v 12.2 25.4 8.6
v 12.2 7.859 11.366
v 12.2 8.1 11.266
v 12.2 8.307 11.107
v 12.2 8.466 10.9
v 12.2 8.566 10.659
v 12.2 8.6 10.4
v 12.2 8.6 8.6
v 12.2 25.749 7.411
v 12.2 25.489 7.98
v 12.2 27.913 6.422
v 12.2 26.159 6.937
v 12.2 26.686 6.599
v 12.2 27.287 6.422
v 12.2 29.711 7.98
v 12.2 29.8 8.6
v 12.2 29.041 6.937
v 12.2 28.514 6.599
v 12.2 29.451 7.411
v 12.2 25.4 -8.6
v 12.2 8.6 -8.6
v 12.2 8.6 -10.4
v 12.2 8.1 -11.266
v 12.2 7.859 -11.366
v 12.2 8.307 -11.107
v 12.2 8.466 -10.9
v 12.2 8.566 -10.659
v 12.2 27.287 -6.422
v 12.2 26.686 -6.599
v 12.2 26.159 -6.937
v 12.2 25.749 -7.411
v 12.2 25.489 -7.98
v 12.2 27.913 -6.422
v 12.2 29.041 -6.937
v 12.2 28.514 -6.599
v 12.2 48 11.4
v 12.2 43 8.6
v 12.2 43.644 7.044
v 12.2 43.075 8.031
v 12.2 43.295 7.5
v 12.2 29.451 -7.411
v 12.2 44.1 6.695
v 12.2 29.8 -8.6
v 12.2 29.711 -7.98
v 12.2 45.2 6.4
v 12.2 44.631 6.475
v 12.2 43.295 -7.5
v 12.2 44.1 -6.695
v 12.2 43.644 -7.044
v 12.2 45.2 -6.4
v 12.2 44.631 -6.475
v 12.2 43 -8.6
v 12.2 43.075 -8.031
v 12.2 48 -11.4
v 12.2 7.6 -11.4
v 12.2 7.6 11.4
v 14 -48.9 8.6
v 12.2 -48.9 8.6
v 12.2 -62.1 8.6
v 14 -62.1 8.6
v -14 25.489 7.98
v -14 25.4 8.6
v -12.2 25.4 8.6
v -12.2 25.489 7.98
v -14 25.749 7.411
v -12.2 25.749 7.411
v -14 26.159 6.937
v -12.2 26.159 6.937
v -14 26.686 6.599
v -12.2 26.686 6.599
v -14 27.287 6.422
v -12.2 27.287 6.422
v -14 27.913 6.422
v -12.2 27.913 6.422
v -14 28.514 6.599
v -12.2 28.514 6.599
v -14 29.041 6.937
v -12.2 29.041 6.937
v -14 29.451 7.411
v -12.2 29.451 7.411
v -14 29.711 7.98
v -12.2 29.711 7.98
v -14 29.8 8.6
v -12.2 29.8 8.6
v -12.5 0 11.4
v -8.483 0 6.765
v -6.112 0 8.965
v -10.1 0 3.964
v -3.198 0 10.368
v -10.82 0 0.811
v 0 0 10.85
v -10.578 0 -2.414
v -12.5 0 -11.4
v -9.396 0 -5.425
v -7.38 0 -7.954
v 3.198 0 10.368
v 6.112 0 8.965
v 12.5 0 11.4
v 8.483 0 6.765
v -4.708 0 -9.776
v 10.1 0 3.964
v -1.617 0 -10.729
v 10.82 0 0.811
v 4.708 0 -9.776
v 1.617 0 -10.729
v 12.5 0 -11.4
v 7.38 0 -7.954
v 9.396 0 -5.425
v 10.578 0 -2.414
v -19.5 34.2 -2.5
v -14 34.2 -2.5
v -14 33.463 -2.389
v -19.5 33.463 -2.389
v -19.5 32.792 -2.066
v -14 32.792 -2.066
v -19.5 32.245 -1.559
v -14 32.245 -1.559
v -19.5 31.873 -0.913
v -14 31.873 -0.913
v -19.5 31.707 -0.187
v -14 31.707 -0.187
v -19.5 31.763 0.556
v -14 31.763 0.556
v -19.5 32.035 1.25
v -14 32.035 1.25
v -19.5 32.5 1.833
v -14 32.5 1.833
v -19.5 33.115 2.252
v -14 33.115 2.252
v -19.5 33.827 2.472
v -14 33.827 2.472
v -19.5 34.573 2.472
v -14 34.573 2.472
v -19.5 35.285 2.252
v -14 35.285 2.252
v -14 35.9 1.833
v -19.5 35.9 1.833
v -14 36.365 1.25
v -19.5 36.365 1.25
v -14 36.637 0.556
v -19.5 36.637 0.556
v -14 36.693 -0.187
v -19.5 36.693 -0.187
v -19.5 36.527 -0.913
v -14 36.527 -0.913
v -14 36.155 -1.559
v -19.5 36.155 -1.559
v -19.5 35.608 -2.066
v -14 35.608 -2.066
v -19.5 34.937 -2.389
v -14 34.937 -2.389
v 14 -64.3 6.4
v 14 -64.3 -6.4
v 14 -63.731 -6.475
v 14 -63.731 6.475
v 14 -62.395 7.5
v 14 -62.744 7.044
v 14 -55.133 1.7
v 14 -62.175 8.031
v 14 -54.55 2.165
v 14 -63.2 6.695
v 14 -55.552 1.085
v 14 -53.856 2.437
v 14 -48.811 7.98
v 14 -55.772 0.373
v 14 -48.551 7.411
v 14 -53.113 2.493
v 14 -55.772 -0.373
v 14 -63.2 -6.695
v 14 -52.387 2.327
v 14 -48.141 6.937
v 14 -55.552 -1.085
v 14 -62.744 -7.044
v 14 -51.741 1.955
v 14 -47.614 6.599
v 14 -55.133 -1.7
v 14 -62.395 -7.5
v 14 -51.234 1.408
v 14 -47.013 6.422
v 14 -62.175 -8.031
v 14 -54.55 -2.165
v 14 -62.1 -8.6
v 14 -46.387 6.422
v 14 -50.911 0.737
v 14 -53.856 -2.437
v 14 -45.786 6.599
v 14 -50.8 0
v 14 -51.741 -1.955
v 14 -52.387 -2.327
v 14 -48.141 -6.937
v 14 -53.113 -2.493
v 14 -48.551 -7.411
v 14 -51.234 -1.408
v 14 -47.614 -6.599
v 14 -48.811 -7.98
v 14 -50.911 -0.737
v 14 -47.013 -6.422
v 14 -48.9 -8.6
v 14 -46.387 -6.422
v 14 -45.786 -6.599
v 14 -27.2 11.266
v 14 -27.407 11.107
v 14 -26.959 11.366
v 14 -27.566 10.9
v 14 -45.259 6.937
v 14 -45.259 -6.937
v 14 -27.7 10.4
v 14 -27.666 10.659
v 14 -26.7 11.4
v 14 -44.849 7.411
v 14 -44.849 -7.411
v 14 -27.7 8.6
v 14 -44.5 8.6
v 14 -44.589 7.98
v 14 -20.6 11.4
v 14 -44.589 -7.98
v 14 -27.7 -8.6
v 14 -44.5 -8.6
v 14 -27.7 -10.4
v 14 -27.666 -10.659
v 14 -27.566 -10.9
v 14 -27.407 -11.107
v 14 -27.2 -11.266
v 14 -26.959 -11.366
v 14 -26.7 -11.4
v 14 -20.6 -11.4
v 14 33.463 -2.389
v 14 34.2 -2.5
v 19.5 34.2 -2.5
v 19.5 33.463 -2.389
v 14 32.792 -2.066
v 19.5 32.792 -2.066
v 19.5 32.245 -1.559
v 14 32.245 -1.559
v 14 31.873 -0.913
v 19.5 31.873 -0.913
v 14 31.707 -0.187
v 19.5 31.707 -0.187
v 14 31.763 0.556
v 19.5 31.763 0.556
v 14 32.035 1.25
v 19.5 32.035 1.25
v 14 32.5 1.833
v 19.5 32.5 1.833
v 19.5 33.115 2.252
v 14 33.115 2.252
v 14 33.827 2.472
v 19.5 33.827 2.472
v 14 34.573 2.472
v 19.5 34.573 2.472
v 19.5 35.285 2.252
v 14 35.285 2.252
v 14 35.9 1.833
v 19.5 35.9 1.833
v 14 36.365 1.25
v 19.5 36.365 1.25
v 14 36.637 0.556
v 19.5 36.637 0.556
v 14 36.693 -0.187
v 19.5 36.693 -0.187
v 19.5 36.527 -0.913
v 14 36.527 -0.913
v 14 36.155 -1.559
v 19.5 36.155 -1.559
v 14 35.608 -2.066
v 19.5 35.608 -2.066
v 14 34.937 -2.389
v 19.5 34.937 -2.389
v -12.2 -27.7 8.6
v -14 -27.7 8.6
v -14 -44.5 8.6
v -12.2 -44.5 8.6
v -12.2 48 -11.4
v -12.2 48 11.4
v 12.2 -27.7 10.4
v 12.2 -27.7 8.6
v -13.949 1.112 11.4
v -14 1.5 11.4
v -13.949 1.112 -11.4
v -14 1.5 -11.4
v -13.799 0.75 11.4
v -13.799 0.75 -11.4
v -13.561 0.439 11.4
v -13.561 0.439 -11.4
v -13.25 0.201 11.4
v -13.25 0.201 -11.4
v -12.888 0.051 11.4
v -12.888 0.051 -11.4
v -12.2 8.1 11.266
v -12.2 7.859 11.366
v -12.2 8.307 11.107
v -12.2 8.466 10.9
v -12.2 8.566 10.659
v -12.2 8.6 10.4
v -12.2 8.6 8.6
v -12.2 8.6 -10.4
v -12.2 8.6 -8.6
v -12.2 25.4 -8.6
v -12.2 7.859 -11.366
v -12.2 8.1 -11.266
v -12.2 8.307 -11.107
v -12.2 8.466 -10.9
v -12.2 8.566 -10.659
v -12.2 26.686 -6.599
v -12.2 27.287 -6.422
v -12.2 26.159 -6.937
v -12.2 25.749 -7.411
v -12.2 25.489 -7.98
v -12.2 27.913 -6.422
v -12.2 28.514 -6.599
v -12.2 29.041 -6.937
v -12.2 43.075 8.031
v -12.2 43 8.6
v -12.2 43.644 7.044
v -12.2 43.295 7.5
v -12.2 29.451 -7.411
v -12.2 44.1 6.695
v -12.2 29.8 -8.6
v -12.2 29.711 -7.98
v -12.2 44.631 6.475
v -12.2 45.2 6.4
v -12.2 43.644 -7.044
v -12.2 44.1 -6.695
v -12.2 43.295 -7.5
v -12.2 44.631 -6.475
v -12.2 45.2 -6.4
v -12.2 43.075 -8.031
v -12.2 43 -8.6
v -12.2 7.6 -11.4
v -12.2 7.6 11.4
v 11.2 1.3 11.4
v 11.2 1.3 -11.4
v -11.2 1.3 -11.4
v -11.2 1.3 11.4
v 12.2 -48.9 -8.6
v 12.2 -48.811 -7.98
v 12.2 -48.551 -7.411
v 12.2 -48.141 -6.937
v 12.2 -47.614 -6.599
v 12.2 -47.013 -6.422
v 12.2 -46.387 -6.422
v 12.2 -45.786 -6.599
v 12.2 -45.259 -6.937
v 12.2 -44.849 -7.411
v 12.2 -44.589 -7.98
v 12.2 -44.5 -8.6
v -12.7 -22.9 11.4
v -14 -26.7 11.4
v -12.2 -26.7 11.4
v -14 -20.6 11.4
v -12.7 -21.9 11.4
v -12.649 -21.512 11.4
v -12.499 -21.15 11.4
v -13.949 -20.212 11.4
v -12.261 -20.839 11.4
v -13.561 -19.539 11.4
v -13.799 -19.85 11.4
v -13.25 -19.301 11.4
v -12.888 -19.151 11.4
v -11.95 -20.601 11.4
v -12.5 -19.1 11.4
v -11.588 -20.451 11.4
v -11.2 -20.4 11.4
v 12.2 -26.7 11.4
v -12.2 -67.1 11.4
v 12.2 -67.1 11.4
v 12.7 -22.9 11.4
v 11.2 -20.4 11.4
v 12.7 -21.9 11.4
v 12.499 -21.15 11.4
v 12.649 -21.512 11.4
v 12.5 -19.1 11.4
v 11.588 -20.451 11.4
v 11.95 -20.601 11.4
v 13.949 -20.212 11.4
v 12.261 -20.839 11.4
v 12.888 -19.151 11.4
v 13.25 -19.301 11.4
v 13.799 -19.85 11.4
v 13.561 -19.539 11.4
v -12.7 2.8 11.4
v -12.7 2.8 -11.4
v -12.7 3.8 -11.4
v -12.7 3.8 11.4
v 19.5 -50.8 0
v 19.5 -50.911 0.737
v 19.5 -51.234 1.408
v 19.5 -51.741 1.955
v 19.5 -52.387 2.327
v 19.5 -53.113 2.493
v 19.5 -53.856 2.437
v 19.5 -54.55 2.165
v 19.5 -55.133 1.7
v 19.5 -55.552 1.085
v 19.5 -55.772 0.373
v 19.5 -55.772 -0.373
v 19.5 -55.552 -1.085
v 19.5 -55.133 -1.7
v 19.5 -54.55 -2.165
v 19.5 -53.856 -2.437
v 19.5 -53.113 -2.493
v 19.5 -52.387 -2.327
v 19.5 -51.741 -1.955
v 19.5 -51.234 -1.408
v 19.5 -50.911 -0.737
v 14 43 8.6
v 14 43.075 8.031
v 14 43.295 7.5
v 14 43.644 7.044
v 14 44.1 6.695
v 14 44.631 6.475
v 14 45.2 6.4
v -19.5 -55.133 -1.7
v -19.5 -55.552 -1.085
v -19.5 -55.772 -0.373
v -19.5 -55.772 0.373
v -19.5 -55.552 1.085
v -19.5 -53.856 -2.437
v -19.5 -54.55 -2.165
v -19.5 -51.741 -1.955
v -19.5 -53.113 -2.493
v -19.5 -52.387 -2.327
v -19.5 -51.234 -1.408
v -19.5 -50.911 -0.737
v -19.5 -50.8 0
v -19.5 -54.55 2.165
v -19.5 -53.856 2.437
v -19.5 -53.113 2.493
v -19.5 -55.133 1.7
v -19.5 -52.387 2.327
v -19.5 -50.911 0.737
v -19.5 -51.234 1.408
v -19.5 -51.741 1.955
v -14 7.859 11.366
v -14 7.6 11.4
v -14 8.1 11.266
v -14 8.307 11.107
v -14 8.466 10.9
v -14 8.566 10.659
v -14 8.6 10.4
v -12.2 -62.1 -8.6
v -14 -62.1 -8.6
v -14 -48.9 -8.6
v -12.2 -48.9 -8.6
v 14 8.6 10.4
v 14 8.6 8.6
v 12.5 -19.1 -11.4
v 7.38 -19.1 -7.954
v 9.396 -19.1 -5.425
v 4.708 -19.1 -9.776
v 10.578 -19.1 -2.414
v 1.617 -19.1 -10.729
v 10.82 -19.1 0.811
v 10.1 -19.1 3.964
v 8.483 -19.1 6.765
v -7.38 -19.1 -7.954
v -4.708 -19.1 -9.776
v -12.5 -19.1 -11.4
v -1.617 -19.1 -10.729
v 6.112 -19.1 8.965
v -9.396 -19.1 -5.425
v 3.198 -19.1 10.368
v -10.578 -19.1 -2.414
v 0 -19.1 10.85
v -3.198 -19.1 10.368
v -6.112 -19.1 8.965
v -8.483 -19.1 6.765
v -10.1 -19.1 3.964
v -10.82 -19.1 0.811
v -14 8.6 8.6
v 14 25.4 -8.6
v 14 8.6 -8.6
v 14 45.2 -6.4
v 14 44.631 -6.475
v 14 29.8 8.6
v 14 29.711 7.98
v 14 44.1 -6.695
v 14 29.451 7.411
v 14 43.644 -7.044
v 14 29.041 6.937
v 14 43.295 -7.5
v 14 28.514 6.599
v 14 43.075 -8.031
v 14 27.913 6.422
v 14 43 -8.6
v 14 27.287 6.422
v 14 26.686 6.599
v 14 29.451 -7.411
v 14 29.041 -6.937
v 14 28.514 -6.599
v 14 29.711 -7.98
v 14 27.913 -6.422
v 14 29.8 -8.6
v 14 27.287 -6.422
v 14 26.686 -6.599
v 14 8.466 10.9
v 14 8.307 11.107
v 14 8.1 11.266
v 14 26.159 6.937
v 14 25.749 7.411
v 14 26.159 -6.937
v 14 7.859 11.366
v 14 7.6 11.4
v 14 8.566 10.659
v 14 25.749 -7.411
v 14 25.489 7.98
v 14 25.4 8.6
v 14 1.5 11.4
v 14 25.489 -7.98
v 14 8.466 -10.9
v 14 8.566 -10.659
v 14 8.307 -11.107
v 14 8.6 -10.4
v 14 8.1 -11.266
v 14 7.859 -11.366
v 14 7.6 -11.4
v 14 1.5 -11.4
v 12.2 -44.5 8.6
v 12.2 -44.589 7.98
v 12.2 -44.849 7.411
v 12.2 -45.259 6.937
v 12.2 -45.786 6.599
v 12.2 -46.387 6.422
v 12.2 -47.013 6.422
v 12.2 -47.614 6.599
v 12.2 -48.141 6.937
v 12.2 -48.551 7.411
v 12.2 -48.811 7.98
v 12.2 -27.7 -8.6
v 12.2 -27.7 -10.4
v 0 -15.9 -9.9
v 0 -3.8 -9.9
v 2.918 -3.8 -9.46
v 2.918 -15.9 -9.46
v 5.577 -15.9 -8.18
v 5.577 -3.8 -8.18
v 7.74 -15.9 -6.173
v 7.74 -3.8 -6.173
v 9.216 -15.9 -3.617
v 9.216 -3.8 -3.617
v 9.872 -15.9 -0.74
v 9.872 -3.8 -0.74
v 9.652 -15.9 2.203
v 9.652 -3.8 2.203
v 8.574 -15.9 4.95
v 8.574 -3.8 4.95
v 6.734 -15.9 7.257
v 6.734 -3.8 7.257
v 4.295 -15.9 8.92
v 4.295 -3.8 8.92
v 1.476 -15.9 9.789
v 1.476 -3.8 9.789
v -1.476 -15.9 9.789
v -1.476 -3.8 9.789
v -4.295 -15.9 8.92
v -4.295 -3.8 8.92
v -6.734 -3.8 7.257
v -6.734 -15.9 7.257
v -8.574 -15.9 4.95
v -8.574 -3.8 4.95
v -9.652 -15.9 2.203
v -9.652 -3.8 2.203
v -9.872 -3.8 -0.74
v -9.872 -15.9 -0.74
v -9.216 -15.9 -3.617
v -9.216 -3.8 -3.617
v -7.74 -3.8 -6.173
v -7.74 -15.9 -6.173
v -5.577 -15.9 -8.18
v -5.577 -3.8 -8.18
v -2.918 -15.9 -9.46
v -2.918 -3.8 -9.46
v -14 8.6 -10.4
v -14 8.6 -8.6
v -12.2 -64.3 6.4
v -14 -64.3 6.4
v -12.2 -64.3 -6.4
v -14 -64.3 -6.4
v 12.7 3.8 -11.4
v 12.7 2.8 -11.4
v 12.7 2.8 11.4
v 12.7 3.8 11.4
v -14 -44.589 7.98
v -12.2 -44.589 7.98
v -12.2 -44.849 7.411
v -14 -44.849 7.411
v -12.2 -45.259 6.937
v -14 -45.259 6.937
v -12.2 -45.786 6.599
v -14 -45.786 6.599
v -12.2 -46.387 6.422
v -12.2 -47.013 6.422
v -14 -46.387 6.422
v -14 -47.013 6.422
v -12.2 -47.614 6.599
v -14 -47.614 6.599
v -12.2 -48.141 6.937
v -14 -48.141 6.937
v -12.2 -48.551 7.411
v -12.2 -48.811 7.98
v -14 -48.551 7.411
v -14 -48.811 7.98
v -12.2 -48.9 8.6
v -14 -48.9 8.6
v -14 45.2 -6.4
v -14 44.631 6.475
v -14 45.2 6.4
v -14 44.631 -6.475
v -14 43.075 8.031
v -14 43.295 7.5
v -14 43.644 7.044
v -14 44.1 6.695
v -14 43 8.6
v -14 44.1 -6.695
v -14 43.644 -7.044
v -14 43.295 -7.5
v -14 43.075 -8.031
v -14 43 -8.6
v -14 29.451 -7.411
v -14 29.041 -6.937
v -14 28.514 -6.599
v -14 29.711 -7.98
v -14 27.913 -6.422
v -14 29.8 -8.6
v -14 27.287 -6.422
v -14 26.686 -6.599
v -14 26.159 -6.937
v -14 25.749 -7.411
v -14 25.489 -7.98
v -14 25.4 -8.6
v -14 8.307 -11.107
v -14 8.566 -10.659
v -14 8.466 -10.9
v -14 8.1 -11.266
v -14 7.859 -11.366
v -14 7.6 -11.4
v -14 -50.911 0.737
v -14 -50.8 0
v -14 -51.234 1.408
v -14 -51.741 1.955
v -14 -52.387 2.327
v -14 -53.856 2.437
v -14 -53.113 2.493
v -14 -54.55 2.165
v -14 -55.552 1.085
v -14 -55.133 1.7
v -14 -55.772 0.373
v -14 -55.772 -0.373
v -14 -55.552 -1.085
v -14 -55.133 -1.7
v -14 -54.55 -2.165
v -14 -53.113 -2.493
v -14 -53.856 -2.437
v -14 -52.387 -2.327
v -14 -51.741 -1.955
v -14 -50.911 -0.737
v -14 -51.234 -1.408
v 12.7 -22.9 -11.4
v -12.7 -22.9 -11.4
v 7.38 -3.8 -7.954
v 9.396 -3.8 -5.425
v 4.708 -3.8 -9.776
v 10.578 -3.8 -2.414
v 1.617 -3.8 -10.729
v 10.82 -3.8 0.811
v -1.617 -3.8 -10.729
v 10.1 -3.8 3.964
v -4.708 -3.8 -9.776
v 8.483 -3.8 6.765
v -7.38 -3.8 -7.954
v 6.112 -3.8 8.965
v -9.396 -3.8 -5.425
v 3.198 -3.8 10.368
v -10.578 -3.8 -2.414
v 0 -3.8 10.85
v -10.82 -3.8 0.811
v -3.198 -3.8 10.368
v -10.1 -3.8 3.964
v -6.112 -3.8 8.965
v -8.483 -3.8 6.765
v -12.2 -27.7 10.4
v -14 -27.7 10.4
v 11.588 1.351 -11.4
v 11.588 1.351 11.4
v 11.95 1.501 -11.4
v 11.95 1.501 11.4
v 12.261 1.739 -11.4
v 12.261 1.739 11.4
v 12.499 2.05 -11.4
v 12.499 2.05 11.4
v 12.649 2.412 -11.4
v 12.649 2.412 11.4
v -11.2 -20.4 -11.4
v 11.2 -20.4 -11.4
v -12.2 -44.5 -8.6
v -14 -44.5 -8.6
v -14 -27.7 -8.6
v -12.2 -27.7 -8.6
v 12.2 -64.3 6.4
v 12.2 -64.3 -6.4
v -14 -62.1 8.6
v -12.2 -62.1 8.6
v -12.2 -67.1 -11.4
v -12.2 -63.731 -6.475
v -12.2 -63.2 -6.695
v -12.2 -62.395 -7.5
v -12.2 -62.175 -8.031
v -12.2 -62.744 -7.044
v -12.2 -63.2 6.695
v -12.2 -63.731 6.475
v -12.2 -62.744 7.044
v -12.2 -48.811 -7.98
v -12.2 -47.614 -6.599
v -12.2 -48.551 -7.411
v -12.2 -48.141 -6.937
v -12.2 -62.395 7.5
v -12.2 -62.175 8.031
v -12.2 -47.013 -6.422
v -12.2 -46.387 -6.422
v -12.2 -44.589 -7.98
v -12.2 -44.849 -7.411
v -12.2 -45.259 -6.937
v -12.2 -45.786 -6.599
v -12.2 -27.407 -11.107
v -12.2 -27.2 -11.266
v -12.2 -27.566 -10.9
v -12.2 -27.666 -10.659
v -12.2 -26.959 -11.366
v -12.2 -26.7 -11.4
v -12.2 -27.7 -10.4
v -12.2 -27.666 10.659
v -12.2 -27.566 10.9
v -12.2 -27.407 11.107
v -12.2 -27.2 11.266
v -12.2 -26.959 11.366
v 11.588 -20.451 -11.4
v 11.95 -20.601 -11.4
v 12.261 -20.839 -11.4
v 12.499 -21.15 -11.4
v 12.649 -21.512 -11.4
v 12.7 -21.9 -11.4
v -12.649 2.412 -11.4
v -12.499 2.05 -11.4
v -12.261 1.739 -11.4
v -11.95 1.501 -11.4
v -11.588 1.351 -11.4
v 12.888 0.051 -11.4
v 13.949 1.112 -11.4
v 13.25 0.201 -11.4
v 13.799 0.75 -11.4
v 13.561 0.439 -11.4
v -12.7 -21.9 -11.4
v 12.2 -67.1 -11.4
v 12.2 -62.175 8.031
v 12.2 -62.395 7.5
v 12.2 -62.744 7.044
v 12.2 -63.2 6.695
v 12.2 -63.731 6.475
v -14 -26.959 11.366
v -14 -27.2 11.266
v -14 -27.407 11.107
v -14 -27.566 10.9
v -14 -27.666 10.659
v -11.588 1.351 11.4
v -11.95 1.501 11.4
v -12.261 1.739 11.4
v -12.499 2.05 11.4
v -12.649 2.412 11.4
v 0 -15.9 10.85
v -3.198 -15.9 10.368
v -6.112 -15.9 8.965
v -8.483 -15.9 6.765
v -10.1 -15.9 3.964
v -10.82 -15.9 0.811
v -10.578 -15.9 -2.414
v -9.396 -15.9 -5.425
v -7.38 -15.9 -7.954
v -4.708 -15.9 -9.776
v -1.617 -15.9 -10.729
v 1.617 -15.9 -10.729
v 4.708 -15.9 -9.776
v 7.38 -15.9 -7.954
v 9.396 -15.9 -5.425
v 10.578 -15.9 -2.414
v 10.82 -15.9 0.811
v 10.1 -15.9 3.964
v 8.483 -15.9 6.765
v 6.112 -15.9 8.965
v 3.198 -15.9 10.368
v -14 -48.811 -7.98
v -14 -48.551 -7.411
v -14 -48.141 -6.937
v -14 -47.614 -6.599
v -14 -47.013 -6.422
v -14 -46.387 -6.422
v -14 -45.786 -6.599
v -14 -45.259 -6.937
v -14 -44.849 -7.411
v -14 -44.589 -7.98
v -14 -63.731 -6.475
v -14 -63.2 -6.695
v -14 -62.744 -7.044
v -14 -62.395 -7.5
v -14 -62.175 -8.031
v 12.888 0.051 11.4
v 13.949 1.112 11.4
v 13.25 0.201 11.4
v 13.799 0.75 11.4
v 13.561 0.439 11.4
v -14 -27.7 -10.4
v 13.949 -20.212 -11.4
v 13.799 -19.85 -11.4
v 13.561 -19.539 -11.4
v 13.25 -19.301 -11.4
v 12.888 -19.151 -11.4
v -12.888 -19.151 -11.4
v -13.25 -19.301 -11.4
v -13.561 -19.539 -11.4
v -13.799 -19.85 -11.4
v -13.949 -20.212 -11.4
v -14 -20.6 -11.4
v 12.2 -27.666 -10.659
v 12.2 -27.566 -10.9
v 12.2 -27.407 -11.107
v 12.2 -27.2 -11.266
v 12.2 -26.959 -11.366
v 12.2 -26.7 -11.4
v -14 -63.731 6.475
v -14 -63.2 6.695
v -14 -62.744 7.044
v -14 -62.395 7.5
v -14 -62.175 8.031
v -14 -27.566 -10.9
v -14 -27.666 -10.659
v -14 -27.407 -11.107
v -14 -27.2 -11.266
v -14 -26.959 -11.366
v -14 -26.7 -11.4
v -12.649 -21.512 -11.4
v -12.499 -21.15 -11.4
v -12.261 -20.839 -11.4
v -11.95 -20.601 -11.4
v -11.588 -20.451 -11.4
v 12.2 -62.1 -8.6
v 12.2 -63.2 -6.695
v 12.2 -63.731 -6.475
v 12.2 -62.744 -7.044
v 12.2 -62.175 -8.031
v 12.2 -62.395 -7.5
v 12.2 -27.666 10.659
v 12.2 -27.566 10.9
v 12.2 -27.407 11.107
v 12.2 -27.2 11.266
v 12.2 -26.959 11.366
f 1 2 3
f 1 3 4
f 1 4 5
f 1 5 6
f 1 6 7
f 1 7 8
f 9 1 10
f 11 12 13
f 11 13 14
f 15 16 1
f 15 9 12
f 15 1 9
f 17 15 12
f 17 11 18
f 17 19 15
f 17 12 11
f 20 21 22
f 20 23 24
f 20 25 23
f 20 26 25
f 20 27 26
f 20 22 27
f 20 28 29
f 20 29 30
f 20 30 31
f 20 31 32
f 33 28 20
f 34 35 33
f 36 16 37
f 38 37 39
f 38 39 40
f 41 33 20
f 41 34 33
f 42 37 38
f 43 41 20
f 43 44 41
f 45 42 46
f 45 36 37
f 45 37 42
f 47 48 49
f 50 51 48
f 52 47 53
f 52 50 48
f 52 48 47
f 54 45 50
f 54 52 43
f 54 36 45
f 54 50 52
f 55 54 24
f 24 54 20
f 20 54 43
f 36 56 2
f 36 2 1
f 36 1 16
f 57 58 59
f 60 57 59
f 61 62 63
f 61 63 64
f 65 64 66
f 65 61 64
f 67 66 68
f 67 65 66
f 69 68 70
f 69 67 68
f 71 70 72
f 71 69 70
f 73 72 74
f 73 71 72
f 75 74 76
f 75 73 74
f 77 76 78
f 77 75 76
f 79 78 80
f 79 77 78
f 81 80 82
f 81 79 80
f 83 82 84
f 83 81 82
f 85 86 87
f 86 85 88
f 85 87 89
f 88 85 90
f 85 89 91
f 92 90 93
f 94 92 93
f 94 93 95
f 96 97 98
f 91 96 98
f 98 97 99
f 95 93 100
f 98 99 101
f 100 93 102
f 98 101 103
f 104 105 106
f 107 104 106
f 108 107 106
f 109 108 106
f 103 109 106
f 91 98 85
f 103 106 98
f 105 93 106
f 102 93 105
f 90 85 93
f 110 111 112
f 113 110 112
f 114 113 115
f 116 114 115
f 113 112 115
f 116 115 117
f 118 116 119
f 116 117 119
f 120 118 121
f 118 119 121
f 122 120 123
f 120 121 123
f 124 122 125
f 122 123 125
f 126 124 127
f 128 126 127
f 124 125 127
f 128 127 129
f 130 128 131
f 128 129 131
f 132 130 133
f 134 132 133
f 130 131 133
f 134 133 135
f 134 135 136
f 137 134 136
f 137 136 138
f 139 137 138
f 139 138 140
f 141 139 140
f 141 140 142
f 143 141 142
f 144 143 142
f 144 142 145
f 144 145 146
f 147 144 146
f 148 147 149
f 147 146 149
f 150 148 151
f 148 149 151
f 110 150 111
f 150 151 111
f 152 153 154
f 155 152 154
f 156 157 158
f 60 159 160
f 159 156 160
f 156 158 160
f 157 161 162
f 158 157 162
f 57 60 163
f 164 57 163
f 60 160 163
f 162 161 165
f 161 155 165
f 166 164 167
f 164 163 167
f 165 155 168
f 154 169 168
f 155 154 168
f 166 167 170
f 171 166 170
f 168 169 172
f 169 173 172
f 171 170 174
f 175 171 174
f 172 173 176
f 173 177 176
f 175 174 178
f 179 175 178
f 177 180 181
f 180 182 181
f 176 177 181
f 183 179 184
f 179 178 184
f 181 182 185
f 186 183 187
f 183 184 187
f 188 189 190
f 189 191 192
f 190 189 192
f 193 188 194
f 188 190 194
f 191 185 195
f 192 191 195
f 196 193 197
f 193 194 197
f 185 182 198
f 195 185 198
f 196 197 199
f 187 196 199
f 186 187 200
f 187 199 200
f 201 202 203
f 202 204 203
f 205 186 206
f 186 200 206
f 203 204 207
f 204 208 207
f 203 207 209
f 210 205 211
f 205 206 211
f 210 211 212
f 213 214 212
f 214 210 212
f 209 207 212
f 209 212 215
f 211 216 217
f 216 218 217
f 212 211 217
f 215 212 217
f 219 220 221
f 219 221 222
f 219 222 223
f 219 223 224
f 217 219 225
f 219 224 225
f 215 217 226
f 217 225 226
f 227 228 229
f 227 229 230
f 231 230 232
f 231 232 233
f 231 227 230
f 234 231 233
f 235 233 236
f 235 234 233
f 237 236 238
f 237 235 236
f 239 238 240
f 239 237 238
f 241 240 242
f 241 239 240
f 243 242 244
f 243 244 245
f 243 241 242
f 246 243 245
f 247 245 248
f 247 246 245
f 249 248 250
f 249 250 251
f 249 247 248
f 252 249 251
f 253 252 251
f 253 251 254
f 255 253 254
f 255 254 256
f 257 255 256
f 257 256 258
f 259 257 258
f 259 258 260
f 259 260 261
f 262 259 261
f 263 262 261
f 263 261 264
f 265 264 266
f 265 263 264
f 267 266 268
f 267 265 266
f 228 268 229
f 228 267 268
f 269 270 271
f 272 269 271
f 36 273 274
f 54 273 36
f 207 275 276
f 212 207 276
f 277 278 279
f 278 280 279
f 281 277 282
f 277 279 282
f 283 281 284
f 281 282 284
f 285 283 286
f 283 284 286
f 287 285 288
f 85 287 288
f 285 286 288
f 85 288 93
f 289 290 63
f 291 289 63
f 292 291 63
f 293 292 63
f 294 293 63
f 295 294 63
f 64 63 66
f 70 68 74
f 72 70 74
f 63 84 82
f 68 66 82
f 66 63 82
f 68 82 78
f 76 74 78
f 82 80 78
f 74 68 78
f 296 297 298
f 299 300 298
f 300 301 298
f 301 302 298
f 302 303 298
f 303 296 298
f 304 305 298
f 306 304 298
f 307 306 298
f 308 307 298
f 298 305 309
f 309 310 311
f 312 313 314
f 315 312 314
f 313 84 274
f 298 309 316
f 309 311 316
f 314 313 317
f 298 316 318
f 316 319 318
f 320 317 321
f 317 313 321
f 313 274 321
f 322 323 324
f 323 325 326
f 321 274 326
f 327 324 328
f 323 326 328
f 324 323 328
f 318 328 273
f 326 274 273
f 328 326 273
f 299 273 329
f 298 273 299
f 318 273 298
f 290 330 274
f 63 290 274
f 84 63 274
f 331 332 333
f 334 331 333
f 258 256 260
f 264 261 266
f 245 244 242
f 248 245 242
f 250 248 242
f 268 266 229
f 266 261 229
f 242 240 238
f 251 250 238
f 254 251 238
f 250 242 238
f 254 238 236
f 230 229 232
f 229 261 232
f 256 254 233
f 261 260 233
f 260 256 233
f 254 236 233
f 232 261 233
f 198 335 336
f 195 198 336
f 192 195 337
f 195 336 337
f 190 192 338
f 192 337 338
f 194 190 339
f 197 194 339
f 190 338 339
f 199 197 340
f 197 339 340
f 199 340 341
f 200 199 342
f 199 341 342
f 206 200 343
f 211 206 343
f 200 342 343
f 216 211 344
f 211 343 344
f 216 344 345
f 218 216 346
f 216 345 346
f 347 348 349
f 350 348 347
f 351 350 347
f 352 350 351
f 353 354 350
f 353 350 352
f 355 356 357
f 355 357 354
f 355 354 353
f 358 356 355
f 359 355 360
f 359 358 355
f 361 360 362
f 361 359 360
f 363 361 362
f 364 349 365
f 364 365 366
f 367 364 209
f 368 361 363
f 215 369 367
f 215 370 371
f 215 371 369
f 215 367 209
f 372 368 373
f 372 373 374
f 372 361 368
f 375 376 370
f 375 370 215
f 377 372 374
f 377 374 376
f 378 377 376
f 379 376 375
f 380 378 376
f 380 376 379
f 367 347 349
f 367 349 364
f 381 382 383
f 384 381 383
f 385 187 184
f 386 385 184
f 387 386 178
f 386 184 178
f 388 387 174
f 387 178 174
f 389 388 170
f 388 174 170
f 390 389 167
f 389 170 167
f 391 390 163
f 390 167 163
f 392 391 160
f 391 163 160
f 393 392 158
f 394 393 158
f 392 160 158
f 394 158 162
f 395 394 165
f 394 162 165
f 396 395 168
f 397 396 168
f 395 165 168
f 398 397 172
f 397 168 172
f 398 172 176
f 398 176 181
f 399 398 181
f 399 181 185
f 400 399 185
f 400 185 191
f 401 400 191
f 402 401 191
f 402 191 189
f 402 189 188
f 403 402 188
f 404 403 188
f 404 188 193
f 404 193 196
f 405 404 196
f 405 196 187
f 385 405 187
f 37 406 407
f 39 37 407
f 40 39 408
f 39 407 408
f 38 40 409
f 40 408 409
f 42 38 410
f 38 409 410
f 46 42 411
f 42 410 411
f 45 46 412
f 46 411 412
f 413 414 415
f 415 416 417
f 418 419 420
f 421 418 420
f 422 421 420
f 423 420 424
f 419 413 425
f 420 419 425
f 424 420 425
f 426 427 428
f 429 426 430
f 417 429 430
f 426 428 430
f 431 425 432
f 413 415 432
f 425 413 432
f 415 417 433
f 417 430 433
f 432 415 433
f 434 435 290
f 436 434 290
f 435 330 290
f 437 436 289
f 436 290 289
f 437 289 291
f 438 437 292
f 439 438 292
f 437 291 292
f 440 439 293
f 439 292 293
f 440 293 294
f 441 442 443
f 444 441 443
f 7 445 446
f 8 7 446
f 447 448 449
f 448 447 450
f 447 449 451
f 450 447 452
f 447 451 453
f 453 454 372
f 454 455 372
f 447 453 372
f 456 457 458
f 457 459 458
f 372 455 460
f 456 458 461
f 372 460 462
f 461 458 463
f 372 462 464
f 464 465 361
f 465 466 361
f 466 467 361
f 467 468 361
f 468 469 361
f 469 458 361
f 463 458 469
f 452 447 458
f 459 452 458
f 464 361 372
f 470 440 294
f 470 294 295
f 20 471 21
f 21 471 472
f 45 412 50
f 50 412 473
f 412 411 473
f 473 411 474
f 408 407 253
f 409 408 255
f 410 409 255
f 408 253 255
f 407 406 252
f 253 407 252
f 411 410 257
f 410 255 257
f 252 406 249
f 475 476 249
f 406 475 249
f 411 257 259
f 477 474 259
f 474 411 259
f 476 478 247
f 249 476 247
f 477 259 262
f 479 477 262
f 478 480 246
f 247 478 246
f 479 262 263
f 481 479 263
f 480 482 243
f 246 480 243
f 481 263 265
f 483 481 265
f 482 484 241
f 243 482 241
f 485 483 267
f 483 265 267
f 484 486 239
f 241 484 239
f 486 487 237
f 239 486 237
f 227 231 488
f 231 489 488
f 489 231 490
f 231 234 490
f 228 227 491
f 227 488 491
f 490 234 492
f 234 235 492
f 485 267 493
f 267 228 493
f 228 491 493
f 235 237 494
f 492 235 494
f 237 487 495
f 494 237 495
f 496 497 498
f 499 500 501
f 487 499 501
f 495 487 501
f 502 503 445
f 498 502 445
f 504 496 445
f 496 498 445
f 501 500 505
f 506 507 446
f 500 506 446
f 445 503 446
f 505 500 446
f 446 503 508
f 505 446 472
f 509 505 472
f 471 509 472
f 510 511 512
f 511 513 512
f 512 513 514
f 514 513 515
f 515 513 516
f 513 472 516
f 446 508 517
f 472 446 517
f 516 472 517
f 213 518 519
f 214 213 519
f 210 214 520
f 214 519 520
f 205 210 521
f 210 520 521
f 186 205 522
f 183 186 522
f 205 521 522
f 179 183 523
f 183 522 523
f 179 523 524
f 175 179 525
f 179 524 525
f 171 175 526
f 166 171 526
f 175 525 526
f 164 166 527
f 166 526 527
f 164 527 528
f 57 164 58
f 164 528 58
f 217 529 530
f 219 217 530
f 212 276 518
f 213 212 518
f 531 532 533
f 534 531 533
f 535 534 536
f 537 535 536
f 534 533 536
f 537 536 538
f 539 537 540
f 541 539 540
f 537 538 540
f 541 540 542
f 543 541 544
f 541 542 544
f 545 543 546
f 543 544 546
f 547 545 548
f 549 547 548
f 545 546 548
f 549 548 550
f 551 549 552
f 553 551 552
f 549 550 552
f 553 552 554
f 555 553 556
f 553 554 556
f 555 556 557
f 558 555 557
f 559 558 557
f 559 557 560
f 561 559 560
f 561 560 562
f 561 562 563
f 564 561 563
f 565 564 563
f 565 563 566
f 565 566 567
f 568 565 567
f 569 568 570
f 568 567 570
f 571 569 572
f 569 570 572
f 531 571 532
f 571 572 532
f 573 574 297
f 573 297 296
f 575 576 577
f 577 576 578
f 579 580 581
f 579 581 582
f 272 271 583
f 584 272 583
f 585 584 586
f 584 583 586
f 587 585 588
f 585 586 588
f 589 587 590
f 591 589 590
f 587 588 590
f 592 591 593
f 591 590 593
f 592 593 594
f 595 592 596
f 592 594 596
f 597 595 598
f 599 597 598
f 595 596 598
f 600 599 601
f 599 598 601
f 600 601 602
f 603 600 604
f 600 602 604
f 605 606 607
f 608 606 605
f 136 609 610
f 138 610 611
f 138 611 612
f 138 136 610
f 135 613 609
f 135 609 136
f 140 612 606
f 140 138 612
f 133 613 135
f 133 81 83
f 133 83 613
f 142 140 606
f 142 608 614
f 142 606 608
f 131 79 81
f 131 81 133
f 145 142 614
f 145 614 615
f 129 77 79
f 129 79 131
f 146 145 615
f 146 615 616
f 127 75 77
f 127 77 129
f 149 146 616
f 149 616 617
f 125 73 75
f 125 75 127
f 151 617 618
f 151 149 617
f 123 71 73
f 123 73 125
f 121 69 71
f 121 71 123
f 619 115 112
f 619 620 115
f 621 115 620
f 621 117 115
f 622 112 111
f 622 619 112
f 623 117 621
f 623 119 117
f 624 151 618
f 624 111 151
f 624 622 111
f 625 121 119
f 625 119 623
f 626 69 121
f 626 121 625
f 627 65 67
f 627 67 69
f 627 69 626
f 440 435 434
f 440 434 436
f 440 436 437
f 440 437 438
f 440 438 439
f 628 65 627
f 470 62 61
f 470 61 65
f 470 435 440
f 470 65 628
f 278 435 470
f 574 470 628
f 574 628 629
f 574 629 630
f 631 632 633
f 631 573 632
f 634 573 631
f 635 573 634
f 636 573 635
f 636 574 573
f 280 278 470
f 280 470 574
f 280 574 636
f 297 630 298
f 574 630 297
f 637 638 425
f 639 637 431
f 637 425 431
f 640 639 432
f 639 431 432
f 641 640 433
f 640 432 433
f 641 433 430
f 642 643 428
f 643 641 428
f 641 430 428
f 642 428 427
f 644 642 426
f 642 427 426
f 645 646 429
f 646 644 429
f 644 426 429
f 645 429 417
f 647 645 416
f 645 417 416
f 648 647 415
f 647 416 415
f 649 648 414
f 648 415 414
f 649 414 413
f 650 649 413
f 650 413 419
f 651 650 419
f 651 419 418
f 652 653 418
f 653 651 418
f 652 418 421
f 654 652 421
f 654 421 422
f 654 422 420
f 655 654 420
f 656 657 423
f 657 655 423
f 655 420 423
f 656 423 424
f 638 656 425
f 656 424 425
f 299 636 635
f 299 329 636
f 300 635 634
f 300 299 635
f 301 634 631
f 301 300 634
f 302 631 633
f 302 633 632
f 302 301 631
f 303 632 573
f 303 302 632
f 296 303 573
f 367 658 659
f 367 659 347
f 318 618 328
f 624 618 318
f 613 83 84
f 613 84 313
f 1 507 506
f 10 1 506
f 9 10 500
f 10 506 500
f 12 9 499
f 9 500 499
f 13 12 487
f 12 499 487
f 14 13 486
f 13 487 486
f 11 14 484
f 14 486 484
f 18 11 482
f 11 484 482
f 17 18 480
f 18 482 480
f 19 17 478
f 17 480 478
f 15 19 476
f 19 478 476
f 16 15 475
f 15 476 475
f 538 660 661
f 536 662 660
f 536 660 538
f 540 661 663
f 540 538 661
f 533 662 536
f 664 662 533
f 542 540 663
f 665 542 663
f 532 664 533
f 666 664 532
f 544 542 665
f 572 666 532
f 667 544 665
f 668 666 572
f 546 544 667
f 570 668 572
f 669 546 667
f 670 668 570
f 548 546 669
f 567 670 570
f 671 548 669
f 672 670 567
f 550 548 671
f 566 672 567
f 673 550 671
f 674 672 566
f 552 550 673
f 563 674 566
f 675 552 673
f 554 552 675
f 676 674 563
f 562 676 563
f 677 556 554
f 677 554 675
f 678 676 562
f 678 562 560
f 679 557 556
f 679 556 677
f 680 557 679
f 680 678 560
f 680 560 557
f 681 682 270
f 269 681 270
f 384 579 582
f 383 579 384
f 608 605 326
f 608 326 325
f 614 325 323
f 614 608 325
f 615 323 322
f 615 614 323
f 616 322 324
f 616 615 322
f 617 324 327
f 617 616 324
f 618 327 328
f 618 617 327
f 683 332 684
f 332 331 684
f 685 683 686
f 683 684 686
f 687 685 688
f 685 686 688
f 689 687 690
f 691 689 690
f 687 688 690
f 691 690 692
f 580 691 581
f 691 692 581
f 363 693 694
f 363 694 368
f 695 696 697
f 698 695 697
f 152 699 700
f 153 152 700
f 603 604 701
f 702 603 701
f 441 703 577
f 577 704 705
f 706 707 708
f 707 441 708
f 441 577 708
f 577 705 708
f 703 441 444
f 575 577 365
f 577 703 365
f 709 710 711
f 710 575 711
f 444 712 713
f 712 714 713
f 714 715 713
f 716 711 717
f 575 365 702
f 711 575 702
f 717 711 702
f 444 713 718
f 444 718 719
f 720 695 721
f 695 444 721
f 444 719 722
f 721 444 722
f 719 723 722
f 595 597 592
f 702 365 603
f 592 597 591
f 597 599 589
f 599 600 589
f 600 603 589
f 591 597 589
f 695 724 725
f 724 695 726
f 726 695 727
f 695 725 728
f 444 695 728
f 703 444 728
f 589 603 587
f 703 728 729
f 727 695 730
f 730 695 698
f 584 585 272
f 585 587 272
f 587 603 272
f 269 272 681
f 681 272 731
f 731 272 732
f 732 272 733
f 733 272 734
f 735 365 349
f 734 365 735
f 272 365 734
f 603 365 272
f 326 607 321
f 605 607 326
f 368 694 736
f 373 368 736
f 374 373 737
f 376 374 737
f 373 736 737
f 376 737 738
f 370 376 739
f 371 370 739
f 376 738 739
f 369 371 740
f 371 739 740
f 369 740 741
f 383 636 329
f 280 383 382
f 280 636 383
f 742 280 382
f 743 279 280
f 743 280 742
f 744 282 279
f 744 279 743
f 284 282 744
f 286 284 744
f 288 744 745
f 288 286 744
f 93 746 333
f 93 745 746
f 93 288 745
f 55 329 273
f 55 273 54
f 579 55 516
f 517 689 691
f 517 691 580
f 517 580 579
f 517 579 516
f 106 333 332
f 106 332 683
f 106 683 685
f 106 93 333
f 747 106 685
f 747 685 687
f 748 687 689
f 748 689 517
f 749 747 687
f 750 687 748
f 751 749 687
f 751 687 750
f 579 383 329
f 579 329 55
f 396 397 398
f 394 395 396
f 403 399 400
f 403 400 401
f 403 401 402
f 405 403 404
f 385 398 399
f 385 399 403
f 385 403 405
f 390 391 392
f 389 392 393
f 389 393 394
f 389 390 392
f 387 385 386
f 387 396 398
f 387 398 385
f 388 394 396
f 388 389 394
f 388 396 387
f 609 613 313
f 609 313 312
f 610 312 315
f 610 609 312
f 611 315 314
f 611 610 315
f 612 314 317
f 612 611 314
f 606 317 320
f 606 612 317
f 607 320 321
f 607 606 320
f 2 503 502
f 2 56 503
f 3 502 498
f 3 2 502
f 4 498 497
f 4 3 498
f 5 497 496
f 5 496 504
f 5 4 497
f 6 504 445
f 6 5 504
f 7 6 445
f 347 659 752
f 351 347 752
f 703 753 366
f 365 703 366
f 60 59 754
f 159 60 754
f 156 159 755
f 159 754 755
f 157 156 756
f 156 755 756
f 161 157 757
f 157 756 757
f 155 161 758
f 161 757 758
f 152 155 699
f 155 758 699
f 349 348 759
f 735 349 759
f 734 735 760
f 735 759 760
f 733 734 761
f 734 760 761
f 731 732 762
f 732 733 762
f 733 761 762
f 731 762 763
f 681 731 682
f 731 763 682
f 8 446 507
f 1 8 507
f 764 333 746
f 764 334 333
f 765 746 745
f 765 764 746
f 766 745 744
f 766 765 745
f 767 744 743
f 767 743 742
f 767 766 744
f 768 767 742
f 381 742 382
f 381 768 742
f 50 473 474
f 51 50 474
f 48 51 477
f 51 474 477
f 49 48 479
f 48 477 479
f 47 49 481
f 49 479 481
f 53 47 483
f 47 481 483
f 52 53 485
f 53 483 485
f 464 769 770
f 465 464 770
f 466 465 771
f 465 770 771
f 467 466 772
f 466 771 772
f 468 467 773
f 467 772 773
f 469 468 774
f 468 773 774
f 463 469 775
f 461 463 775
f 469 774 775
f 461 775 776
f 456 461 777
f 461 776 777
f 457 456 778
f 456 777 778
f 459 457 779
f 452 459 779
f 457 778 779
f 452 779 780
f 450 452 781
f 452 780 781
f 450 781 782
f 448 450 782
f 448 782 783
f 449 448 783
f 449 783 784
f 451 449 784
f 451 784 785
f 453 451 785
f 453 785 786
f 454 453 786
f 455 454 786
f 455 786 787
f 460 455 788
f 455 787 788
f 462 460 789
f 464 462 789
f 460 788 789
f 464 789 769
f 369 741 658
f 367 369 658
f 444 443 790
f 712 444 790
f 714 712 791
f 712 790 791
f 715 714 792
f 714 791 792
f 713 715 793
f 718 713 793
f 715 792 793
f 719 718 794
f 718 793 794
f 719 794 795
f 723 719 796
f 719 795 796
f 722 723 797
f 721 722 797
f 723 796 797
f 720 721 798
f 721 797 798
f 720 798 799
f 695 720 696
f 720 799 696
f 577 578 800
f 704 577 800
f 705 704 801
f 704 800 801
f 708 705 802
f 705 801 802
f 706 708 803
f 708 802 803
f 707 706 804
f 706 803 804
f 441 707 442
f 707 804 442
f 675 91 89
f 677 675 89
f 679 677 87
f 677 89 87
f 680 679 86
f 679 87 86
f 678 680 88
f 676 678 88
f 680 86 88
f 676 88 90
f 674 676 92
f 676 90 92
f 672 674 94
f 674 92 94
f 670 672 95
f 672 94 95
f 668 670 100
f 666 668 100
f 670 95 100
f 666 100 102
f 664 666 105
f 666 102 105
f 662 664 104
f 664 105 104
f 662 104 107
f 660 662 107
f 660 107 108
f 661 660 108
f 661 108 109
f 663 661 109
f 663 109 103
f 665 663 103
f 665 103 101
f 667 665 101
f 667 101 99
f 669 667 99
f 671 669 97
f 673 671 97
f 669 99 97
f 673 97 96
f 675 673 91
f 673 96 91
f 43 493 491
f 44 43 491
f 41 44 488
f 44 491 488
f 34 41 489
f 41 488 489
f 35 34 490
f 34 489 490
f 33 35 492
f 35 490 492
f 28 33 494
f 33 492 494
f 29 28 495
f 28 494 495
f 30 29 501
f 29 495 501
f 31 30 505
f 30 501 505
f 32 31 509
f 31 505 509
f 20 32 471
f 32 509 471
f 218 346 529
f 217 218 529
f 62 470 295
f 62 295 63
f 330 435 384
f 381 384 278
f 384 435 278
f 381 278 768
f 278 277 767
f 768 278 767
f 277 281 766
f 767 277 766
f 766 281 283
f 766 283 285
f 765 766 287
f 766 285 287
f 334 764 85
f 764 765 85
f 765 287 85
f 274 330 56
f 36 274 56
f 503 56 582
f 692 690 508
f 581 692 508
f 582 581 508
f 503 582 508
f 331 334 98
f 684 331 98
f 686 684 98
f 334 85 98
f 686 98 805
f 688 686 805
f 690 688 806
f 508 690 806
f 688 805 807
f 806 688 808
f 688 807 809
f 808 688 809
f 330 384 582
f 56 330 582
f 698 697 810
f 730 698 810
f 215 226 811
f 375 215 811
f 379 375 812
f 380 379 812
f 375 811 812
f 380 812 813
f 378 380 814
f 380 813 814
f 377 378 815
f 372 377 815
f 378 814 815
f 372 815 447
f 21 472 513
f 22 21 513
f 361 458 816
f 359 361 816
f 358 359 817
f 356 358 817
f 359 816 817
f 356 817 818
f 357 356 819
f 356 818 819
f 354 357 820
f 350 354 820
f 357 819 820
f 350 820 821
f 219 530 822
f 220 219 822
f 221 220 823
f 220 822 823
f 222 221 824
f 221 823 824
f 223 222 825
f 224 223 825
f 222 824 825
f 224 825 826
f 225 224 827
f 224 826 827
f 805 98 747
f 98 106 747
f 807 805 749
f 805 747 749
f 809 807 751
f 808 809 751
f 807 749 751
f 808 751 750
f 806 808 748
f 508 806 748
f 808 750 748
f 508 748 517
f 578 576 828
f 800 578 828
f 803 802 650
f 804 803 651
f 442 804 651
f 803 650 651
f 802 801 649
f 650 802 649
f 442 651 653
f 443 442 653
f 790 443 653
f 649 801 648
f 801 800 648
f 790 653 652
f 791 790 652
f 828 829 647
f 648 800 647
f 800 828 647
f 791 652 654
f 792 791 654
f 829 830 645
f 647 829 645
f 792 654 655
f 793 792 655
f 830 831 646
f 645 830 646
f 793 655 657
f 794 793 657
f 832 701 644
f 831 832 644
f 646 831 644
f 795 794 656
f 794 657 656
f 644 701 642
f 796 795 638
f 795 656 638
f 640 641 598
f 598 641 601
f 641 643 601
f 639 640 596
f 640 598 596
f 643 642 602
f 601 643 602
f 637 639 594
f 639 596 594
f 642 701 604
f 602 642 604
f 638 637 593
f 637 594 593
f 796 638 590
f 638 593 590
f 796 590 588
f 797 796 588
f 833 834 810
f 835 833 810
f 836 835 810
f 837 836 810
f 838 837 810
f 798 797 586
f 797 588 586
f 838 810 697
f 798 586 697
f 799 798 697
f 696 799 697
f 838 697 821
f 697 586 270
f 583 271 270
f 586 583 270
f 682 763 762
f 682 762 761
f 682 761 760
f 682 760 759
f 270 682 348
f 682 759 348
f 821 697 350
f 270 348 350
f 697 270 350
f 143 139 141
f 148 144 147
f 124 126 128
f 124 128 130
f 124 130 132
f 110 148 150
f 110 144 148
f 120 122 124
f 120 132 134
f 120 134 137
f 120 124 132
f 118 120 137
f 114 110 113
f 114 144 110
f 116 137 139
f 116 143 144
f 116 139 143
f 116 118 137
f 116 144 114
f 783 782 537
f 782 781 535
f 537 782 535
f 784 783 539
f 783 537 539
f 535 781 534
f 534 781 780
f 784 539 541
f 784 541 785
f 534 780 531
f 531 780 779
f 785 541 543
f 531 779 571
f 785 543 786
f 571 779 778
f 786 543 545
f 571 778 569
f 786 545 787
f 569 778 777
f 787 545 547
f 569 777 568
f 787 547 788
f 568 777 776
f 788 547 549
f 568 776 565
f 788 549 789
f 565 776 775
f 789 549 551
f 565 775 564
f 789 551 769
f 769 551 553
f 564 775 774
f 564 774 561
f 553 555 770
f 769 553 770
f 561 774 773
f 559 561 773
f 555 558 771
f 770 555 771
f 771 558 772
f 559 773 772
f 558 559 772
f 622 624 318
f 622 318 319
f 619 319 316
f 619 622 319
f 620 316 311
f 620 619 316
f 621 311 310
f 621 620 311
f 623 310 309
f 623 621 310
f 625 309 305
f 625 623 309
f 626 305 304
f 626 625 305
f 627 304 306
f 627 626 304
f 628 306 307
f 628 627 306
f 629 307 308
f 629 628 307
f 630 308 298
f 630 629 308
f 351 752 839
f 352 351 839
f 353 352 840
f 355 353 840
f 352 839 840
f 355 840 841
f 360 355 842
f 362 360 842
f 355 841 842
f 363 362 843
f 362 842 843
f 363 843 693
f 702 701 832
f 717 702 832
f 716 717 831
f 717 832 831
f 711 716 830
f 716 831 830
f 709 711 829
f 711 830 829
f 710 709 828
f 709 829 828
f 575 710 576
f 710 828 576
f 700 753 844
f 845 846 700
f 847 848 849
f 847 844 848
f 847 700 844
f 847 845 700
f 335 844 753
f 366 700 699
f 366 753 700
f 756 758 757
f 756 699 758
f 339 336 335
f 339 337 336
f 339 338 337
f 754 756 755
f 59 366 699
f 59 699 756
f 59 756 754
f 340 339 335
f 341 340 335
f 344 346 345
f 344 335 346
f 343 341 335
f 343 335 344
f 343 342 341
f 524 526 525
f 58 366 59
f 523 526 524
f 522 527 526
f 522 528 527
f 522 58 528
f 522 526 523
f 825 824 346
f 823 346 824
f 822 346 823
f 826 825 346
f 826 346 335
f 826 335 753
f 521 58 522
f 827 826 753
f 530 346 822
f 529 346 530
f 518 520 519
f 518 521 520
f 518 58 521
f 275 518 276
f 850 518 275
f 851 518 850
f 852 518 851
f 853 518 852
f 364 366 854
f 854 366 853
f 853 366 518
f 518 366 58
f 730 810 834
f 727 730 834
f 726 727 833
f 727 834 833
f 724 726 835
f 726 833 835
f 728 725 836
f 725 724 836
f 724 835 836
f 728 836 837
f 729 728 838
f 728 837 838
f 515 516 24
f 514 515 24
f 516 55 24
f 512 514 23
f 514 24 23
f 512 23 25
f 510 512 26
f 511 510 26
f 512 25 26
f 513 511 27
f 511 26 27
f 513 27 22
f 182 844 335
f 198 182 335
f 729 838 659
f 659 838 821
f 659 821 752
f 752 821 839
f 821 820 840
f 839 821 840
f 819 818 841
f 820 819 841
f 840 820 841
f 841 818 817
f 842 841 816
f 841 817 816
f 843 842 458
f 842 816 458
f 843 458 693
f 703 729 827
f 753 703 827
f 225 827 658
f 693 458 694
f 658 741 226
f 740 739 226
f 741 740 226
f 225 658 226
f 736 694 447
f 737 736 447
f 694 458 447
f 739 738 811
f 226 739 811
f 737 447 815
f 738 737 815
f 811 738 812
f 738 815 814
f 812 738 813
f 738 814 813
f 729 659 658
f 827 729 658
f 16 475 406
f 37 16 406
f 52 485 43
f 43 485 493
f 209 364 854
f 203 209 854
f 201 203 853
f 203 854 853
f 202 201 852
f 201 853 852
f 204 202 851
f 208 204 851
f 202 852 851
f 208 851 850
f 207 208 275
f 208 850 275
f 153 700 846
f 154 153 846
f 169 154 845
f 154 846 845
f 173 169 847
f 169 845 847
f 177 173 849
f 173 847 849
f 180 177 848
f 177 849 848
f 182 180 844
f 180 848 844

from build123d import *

# Parameters (mm, degrees)
SKETCH1_W            = 28
SKETCH1_H            = 22.8
BOSS_EXTRUDE1_DEPTH  = 48
SKETCH4_R            = 10.85
BOSS_EXTRUDE4_DEPTH  = 3.8
SKETCH5_R            = 9.9
BOSS_EXTRUDE5_DEPTH  = 12.1
SKETCH6_R            = 10.85
BOSS_EXTRUDE6_DEPTH  = 3.2
CUT_EXTRUDE3_DEPTH   = 1.8
FILLET2_R            = 1
FILLET2_OF_MIRROR2_R = 1
SKETCH9_W            = 25.4
SKETCH9_H            = 2.5
CUT_EXTRUDE4_DEPTH   = 25.8
FILLET3_R            = 1.5
SKETCH10_R           = 2.5
BOSS_EXTRUDE7_DEPTH  = 5.5
MIRROR6_START        = -12.2
MIRROR6_OUTLINE_W    = 1.3
MIRROR6_OUTLINE_H    = 22.8
MIRROR6_OUTLINE_W_2  = 44.2
MIRROR6_DEPTH        = 24.4
MIRROR6_START_2      = -14
MIRROR6_2_DEPTH      = 28
MIRROR6_START_3      = -19.5
MIRROR6_3_OUTLINE_R  = 2.5
MIRROR6_3_DEPTH      = 39
MIRROR6_START_4      = -12.5
MIRROR6_4_OUTLINE_W  = 1.3
MIRROR6_4_OUTLINE_H  = 22.8
MIRROR6_4_DEPTH      = 25
MIRROR6_START_5      = -11.4
MIRROR6_5_DEPTH      = 22.8


with BuildPart() as part:
    # Sketch1 → Boss-Extrude1 (new body)
    with BuildSketch(Plane(origin=(0, 0, 0), x_dir=(1, 0, 0), z_dir=(0, 1, 0))):
        Rectangle(SKETCH1_W, SKETCH1_H)
    extrude(amount=BOSS_EXTRUDE1_DEPTH)

    # Sketch4 → Boss-Extrude4 (add)
    with BuildSketch(Plane.XZ):
        with Locations(Location((0, 0, 0), (0, 0, 90))):
            Circle(SKETCH4_R)
    extrude(amount=BOSS_EXTRUDE4_DEPTH)

    # Sketch5 → Boss-Extrude5 (add)
    with BuildSketch(Plane.XZ.offset(3.8)):
        with Locations(Location((0, 0, 0), (0, 0, 270))):
            Circle(SKETCH5_R)
    extrude(amount=BOSS_EXTRUDE5_DEPTH)

    # Sketch6 → Boss-Extrude6 (add)
    with BuildSketch(Plane.XZ.offset(15.9)):
        with Locations(Location((0, 0, 0), (0, 0, 90))):
            Circle(SKETCH6_R)
    extrude(amount=BOSS_EXTRUDE6_DEPTH)

    # Sketch8 → Cut-Extrude3 (cut)
    with BuildSketch(Plane(origin=(14, 0, 0), x_dir=(0, 0, -1), z_dir=(1, 0, 0))):
        with BuildLine():
            Line((8.6, 8.6), (11.4, 8.6))
            Line((11.4, 8.6), (11.4, 48))
            Line((11.4, 48), (-11.4, 48))
            Line((-11.4, 48), (-11.4, 8.6))
            Line((-11.4, 8.6), (-8.6, 8.6))
            Line((-8.6, 8.6), (-8.6, 25.4))
            ThreePointArc((-8.6, 25.4), (-6.4, 27.6), (-8.6, 29.8))
            Line((-8.6, 29.8), (-8.6, 43))
            ThreePointArc((-8.6, 43), (-7.044365081, 43.644365081), (-6.4, 45.2))
            Line((-6.4, 45.2), (6.4, 45.2))
            ThreePointArc((6.4, 45.2), (7.044365081, 43.644365081), (8.6, 43))
            Line((8.6, 43), (8.6, 29.8))
            ThreePointArc((8.6, 29.8), (6.4, 27.6), (8.6, 25.4))
            Line((8.6, 25.4), (8.6, 8.6))
        make_face()
    cut_extrude3 = extrude(amount=-CUT_EXTRUDE3_DEPTH, mode=Mode.SUBTRACT)

    # Fillet2
    fillet2_edges = [part.edges().sort_by_distance(p)[0] for p in [
        (13.1, 8.6, 11.4),
        (13.1, 8.6, -11.4),
    ]]
    fillet(fillet2_edges, radius=FILLET2_R)

    # Mirror2: Cut-Extrude3 across plane
    add(cut_extrude3.mirror(Plane(origin=(0, 0, 0), x_dir=(0, 0, 1), z_dir=(1, 0, 0))), mode=Mode.SUBTRACT)

    # Fillet2 of Mirror2
    fillet2_of_mirror2_edges = [part.edges().sort_by_distance(p)[0] for p in [
        (-13.1, 8.6, 11.4),
        (-13.1, 8.6, -11.4),
    ]]
    fillet(fillet2_of_mirror2_edges, radius=FILLET2_OF_MIRROR2_R)

    # Sketch9 → Cut-Extrude4 (cut)
    with BuildSketch(Plane(origin=(0, 0, -11.4), x_dir=(-1, 0, 0), z_dir=(0, 0, -1))):
        with Locations((0, 2.55)):
            Rectangle(SKETCH9_W, SKETCH9_H)
    extrude(amount=-CUT_EXTRUDE4_DEPTH, mode=Mode.SUBTRACT)

    # Fillet3
    fillet3_edges = [part.edges().sort_by_distance(p)[0] for p in [
        (12.7, 1.3, 0),
        (-12.7, 1.3, 0),
        (-14, 0, 0),
        (14, 0, 0),
    ]]
    fillet(fillet3_edges, radius=FILLET3_R)

    # Sketch10 → Boss-Extrude7 (add)
    with BuildSketch(Plane.ZY.offset(14)):
        with Locations(Location((0, 34.2, 0), (0, 0, 180))):
            Circle(SKETCH10_R)
    boss_extrude7 = extrude(amount=BOSS_EXTRUDE7_DEPTH)

    # Mirror3: Boss-Extrude7 across plane
    add(boss_extrude7.mirror(Plane(origin=(0, 0, 0), x_dir=(0, 0, 1), z_dir=(1, 0, 0))))

    # Mirror6: read off the stored shape, not the designer's step
    # Mirror6 outline → Mirror6 (add)
    with BuildSketch(Plane.YZ.offset(MIRROR6_START)):
        with Locations((-19.75, 0)):
            Rectangle(MIRROR6_OUTLINE_W, MIRROR6_OUTLINE_H)
        with Locations((-45, 0)):
            Rectangle(MIRROR6_OUTLINE_W_2, MIRROR6_OUTLINE_H)
    extrude(amount=MIRROR6_DEPTH)

    # Mirror6 2 outline → Mirror6 2 (add)
    with BuildSketch(Plane.YZ.offset(MIRROR6_START_2)):
        with BuildLine():
            Line((-26.7, -11.4), (-22.9, -11.4))
            Line((-22.9, -11.4), (-22.9, 11.4))
            Line((-22.9, 11.4), (-26.7, 11.4))
            ThreePointArc((-26.7, 11.4), (-27.407106781, 11.107106781), (-27.7, 10.4))
            Line((-27.7, 10.4), (-27.7, 8.6))
            Line((-27.7, 8.6), (-44.5, 8.6))
            ThreePointArc((-44.5, 8.6), (-46.7, 6.4), (-48.9, 8.6))
            Line((-48.9, 8.6), (-62.1, 8.6))
            ThreePointArc((-62.1, 8.6), (-62.744365081, 7.044365081), (-64.3, 6.4))
            Line((-64.3, 6.4), (-64.3, -6.4))
            ThreePointArc((-64.3, -6.4), (-62.744365081, -7.044365081), (-62.1, -8.6))
            Line((-62.1, -8.6), (-48.9, -8.6))
            ThreePointArc((-48.9, -8.6), (-46.7, -6.4), (-44.5, -8.6))
            Line((-44.5, -8.6), (-27.7, -8.6))
            Line((-27.7, -8.6), (-27.7, -10.4))
            ThreePointArc((-27.7, -10.4), (-27.407106781, -11.107106781), (-26.7, -11.4))
        make_face()
    extrude(amount=MIRROR6_2_DEPTH)

    # Mirror6 3 outline → Mirror6 3 (add)
    with BuildSketch(Plane.YZ.offset(MIRROR6_START_3)):
        with Locations((-53.3, 0)):
            Circle(MIRROR6_3_OUTLINE_R)
    extrude(amount=MIRROR6_3_DEPTH)

    # Mirror6 4 outline → Mirror6 4 (add)
    with BuildSketch(Plane.YZ.offset(MIRROR6_START_4)):
        with Locations((-19.75, 0)):
            Rectangle(MIRROR6_4_OUTLINE_W, MIRROR6_4_OUTLINE_H)
    extrude(amount=MIRROR6_4_DEPTH)

    # Mirror6 5 outline → Mirror6 5 (add)
    with BuildSketch(Plane.XY.offset(MIRROR6_START_5)):
        with BuildLine():
            Line((12.7, -21.9), (12.7, -22.9))
            Line((12.7, -22.9), (14, -22.9))
            Line((14, -22.9), (14, -20.6))
            ThreePointArc((14, -20.6), (13.560660172, -19.539339828), (12.5, -19.1))
            Line((12.5, -19.1), (12.5, -20.4))
            Line((12.5, -20.4), (11.2, -20.4))
            ThreePointArc((11.2, -20.4), (12.260660172, -20.839339828), (12.7, -21.9))
        make_face()
        with BuildLine():
            Line((-14, -22.9), (-12.7, -22.9))
            Line((-12.7, -22.9), (-12.7, -21.9))
            ThreePointArc((-12.7, -21.9), (-12.260660172, -20.839339828), (-11.2, -20.4))
            Line((-11.2, -20.4), (-12.5, -20.4))
            Line((-12.5, -20.4), (-12.5, -19.1))
            ThreePointArc((-12.5, -19.1), (-13.560660172, -19.539339828), (-14, -20.6))
            Line((-14, -20.6), (-14, -22.9))
        make_face()
    extrude(amount=MIRROR6_5_DEPTH)


solid = part.part
